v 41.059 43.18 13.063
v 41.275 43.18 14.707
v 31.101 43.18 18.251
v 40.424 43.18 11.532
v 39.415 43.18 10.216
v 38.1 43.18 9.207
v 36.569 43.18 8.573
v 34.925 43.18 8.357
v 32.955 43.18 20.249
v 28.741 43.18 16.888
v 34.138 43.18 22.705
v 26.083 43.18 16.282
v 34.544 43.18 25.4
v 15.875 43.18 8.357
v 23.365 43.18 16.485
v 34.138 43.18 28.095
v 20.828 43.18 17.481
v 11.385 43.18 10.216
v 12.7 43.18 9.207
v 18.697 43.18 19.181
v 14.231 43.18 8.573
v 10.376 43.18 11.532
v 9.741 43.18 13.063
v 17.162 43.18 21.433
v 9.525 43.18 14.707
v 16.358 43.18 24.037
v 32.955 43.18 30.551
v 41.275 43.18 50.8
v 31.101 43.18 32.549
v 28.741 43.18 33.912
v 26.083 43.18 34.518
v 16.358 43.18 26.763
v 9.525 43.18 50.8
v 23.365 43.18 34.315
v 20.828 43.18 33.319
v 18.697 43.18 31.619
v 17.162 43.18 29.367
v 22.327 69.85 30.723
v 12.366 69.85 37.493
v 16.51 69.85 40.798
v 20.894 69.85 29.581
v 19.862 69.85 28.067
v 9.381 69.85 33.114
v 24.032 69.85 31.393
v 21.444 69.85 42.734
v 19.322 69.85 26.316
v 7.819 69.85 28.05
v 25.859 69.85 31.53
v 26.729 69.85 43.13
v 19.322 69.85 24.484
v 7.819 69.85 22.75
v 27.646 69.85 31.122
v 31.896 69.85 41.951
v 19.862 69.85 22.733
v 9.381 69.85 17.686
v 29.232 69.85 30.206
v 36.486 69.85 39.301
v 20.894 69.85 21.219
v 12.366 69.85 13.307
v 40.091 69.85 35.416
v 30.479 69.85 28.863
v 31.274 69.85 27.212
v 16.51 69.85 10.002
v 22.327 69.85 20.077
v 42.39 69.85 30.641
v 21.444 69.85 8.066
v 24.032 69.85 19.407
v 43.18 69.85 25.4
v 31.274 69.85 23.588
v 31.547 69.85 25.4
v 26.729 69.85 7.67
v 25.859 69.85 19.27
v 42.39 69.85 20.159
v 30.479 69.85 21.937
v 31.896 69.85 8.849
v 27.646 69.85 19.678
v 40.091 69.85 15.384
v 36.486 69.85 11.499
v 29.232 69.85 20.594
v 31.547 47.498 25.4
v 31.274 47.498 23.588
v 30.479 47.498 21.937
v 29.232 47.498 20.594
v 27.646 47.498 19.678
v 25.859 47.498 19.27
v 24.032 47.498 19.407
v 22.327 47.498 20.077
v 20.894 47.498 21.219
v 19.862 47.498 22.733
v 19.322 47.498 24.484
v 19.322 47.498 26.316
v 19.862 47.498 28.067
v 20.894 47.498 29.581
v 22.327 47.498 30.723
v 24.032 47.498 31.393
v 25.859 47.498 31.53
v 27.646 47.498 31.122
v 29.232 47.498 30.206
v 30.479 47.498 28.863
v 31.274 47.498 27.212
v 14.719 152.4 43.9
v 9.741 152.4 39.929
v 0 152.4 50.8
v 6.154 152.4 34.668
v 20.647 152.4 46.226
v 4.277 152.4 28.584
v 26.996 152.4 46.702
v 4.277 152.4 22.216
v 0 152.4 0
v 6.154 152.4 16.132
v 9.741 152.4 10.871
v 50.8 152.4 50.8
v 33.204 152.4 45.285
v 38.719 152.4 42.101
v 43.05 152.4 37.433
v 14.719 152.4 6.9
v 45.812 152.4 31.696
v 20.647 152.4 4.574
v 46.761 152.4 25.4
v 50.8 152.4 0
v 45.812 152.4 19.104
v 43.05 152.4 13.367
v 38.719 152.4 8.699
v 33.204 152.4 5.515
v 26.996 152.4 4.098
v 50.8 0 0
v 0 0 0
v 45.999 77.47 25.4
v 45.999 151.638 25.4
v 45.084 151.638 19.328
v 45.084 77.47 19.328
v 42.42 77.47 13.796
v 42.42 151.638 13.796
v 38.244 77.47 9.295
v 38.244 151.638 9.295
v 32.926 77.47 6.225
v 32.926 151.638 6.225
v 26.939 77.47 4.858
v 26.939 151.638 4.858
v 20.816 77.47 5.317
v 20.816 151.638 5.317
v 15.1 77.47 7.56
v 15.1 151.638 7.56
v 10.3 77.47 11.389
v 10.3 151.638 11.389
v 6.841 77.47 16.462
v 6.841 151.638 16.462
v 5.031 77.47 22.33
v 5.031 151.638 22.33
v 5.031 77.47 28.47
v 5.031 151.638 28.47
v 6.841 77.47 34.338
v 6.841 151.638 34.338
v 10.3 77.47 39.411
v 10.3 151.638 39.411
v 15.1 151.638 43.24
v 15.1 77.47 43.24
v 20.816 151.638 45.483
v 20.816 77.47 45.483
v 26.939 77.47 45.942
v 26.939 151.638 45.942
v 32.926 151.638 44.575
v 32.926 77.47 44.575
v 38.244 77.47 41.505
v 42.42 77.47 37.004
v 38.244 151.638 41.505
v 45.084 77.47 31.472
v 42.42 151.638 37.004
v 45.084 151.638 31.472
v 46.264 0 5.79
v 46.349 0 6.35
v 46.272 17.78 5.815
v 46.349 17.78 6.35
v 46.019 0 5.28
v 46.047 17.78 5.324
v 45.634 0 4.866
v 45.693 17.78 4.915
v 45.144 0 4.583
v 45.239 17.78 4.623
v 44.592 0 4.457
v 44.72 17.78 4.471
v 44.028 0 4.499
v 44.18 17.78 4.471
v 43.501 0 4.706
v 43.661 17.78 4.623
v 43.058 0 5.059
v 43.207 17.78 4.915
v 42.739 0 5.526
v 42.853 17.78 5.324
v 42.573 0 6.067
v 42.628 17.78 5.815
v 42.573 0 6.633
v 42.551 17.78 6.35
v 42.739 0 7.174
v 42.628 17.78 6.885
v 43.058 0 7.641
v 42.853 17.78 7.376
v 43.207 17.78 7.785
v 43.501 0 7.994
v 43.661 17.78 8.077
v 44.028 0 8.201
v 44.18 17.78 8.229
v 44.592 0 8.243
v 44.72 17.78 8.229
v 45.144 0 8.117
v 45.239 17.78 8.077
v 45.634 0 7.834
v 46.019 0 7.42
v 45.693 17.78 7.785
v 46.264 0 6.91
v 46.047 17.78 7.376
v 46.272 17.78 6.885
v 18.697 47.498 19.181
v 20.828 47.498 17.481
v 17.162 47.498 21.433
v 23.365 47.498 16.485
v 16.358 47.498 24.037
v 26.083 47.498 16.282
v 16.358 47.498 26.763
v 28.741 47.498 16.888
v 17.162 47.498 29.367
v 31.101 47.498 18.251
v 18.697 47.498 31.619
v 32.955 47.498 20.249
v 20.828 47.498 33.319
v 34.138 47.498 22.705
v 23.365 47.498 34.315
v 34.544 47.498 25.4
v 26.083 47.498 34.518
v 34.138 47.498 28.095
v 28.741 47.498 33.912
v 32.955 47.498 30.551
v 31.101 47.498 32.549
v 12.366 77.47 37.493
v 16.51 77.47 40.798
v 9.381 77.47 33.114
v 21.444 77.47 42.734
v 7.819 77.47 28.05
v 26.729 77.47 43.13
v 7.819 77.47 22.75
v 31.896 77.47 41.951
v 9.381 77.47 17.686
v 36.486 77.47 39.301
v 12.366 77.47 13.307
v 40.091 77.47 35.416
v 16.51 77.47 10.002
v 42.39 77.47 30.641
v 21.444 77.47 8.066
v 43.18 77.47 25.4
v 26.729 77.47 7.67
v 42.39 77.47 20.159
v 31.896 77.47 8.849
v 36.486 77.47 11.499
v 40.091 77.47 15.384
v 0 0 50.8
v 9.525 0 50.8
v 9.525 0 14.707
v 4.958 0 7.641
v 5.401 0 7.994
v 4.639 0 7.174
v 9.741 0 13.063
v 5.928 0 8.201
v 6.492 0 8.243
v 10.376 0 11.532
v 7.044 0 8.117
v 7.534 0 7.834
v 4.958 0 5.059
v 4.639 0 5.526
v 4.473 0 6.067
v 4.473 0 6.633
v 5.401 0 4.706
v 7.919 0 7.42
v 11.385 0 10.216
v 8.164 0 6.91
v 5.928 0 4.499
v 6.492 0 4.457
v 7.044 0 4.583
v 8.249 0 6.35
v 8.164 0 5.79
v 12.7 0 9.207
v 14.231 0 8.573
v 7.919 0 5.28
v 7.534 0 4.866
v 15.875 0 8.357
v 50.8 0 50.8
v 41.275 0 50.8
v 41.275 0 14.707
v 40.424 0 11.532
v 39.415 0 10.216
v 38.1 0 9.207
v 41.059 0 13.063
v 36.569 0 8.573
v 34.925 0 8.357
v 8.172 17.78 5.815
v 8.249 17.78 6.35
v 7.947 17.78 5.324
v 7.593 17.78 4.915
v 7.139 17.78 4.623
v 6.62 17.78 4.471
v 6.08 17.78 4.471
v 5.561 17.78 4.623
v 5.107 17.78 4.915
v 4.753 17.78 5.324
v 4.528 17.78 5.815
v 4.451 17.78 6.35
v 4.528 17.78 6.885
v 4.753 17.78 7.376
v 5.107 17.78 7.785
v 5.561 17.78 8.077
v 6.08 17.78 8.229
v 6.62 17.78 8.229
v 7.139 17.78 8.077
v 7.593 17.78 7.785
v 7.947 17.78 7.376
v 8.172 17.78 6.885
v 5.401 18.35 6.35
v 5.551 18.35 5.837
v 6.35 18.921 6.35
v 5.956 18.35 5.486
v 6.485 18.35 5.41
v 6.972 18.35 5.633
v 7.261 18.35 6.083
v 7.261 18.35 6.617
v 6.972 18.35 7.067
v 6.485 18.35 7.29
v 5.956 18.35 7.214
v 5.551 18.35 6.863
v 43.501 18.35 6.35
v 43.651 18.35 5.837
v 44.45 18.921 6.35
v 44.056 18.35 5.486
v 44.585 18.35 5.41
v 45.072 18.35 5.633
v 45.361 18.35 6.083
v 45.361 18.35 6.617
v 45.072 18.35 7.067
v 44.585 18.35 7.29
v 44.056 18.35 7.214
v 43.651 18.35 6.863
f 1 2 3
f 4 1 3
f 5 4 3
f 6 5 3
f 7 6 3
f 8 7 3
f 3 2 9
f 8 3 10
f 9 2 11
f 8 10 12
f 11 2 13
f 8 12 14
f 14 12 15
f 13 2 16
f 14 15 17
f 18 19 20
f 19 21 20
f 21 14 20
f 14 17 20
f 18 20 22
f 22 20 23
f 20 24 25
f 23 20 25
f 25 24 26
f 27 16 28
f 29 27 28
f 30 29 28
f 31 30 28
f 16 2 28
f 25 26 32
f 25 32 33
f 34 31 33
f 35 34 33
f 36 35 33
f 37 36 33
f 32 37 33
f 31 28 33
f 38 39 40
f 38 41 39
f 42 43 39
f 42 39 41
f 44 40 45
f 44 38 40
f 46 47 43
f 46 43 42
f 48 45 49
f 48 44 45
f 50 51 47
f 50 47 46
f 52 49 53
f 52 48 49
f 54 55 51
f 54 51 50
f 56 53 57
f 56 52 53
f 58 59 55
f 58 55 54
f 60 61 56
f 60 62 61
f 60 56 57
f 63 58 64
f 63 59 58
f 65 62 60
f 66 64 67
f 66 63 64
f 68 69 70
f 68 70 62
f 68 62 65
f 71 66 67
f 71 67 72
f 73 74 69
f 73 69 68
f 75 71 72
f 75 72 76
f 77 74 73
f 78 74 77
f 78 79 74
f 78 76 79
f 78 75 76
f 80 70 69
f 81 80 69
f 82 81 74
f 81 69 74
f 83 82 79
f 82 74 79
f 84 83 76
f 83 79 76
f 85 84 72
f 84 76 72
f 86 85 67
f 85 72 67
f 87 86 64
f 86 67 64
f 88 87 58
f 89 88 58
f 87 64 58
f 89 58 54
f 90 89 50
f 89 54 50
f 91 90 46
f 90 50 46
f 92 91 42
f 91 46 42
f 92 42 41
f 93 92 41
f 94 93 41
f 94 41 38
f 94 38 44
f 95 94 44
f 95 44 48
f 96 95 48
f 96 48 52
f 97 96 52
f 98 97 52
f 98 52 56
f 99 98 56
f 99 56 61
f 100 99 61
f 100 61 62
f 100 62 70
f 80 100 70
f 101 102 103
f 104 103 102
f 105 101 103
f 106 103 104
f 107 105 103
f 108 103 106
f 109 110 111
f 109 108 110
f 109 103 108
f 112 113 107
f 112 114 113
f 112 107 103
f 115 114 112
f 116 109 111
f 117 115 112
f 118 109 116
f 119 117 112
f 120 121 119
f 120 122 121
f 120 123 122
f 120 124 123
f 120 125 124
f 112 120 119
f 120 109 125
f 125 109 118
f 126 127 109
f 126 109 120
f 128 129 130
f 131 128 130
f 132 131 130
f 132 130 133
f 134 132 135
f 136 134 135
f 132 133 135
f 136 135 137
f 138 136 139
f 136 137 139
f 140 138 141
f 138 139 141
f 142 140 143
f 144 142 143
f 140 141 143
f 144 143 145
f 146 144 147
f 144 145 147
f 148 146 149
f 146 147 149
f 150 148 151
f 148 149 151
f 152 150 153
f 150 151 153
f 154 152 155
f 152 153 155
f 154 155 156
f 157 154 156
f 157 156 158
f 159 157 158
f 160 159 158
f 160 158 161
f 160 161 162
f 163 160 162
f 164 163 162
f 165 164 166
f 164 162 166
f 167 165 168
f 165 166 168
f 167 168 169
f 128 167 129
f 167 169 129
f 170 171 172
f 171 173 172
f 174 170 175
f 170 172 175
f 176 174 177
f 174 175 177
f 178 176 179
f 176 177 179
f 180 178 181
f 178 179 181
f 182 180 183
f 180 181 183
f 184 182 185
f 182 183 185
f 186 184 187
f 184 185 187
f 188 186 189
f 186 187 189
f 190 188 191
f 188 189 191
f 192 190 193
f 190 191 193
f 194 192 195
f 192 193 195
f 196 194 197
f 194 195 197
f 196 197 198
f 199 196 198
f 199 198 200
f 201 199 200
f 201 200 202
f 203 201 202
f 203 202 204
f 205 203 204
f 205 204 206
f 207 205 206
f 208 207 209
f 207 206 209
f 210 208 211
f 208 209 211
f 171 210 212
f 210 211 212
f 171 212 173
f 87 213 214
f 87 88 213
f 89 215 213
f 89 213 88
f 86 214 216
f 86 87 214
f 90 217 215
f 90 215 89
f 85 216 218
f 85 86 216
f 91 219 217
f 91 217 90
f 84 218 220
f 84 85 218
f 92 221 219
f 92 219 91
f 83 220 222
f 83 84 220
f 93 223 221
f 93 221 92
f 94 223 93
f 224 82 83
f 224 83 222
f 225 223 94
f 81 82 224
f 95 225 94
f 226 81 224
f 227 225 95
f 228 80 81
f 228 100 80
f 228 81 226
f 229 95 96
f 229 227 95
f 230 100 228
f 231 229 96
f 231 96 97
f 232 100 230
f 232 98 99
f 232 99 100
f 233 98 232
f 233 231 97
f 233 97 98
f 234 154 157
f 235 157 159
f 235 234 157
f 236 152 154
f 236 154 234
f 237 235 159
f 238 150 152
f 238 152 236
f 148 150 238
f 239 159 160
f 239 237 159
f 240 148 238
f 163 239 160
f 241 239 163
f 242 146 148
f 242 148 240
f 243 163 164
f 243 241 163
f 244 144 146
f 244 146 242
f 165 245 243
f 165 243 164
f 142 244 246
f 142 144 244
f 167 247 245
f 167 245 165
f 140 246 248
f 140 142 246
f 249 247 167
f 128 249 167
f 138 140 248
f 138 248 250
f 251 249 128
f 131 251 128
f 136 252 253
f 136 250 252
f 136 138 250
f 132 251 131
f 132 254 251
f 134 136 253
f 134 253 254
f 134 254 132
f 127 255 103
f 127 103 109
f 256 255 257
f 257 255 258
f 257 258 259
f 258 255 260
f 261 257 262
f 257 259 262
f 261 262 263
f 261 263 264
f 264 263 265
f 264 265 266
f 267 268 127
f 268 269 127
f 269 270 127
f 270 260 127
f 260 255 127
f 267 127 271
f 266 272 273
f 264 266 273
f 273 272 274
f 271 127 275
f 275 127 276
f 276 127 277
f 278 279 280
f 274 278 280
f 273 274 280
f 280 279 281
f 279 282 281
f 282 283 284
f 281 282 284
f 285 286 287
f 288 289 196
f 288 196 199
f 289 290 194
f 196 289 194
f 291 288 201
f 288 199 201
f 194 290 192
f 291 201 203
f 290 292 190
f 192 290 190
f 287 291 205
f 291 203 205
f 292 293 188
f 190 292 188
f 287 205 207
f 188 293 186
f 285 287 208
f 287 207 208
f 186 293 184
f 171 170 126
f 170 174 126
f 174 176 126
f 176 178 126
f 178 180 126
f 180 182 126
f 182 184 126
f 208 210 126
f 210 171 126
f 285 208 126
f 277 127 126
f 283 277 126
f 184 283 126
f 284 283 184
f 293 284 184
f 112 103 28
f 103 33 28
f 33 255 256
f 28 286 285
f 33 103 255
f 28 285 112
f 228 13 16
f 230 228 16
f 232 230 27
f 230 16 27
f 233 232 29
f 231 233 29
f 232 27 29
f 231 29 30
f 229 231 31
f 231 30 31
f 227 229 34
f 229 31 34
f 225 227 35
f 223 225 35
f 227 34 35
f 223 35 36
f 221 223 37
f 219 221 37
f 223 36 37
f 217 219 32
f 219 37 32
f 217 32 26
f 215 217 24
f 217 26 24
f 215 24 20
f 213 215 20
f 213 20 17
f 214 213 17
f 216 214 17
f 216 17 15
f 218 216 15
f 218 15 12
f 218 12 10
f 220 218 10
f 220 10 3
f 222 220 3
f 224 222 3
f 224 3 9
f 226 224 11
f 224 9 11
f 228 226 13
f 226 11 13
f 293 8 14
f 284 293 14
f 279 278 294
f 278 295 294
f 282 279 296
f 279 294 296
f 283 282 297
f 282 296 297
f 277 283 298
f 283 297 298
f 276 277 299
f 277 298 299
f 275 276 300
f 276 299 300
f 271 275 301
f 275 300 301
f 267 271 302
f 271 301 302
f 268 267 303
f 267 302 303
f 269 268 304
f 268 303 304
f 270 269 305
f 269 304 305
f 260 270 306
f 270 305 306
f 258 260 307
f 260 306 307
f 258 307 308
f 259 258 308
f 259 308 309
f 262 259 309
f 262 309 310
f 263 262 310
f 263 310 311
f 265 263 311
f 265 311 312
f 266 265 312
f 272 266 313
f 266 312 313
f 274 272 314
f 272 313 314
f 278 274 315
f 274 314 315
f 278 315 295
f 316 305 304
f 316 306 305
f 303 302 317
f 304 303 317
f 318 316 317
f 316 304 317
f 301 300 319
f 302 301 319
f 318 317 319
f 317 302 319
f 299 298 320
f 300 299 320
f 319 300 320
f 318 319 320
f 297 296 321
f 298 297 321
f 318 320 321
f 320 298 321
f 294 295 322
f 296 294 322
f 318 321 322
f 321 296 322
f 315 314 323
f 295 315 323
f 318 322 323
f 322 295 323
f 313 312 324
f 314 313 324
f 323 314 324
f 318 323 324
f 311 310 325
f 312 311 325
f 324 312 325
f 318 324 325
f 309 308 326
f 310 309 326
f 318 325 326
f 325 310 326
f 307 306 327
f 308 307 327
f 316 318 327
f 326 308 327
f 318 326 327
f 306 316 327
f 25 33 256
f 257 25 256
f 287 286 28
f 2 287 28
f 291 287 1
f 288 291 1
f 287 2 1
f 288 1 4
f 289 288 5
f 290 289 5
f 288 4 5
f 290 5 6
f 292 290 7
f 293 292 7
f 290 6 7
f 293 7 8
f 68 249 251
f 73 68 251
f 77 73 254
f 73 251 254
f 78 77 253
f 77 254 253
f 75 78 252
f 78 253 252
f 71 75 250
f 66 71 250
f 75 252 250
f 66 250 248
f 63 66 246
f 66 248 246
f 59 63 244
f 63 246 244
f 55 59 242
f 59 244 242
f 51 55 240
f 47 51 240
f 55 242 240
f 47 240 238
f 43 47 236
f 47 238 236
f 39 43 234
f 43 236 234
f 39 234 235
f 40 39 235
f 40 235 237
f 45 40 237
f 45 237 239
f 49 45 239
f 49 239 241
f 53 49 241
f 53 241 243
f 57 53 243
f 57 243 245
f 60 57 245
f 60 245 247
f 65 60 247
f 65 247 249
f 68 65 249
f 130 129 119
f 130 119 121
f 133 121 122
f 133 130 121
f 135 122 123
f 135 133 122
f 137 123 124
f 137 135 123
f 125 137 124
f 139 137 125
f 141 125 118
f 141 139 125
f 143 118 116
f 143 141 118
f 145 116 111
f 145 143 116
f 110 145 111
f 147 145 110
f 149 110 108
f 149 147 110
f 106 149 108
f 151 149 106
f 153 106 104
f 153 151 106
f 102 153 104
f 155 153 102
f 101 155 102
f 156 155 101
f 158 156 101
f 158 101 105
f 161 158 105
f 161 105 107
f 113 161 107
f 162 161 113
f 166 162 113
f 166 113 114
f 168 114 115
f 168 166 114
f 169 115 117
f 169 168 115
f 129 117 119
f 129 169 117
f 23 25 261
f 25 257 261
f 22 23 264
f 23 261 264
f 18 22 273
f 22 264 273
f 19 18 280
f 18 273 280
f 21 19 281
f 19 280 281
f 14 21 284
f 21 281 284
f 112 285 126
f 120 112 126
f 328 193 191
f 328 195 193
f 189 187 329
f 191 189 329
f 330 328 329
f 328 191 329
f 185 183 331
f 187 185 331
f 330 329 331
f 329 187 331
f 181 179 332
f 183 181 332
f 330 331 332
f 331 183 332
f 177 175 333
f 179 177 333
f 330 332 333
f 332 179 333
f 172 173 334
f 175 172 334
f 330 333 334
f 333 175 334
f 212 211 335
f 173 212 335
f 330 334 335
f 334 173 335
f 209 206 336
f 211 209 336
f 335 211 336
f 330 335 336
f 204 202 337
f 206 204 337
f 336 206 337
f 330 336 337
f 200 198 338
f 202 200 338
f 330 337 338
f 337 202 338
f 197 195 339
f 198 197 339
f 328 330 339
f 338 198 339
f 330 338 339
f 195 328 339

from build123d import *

# Parameters (mm, degrees)
SKETCH1_W                  = 50.8
SKETCH1_H                  = 50.8
BOSS_EXTRUDE1_DEPTH        = 152.4
SKETCH2_R                  = 6.1468
CUT_EXTRUDE1_DEPTH         = 153.4
SKETCH3_R                  = 20.5994
CUT_EXTRUDE2_DEPTH         = 74.93
SKETCH4_R                  = 17.78
CUT_EXTRUDE3_DEPTH         = 82.55
CUT_EXTRUDE4_DEPTH         = 42.4434
SKETCH6_R                  = 9.144
CUT_EXTRUDE5_DEPTH         = 4.318
FILLET1_R                  = 6.35
F_10_24_TAPPED_HOLE1_D     = 3.7973
F_10_24_TAPPED_HOLE1_DEPTH = 17.78
F_10_24_TAPPED_HOLE1_TIP   = 1.140824014
CHAMFER1_SIZE              = 0.762


with BuildPart() as part:
    # Sketch1 → Boss-Extrude1 (new body)
    with BuildSketch(Plane(origin=(0, 0, 0), x_dir=(1, 0, 0), z_dir=(0, 1, 0))):
        with Locations((25.4, -25.4)):
            Rectangle(SKETCH1_W, SKETCH1_H)
    extrude(amount=BOSS_EXTRUDE1_DEPTH)

    # Sketch2 → Cut-Extrude1 (cut, through all)
    with BuildSketch(Plane(origin=(0, 152.4, 0), x_dir=(1, 0, 0), z_dir=(0, 1, 0))):
        with Locations((25.4, -25.4)):
            Circle(SKETCH2_R)
    extrude(amount=-CUT_EXTRUDE1_DEPTH, mode=Mode.SUBTRACT)

    # Sketch3 → Cut-Extrude2 (cut)
    with BuildSketch(Plane(origin=(0, 152.4, 0), x_dir=(1, 0, 0), z_dir=(0, 1, 0))):
        with Locations((25.4, -25.4)):
            Circle(SKETCH3_R)
    extrude(amount=-CUT_EXTRUDE2_DEPTH, mode=Mode.SUBTRACT)

    # Sketch4 → Cut-Extrude3 (cut)
    with BuildSketch(Plane(origin=(0, 152.4, 0), x_dir=(1, 0, 0), z_dir=(0, 1, 0))):
        with Locations((25.4, -25.4)):
            Circle(SKETCH4_R)
    extrude(amount=-CUT_EXTRUDE3_DEPTH, mode=Mode.SUBTRACT)

    # Sketch5 → Cut-Extrude4 (cut)
    with BuildSketch(Plane.XY.offset(50.8)):
        Polygon((9.525, 0), (9.525, 36.83), (9.525, 43.18), (15.875, 43.18), (34.925, 43.18), (41.275, 43.18), (41.275, 36.83), (41.275, 0), align=None)
    extrude(amount=-CUT_EXTRUDE4_DEPTH, mode=Mode.SUBTRACT)

    # Sketch6 → Cut-Extrude5 (cut)
    with BuildSketch(Plane.XZ.offset(-43.18)):
        with Locations((25.4, 25.4)):
            Circle(SKETCH6_R)
    extrude(amount=-CUT_EXTRUDE5_DEPTH, mode=Mode.SUBTRACT)

    # Fillet1
    fillet1_edges = [part.edges().sort_by_distance(p)[0] for p in [
        (9.525, 21.59, 8.3566),
        (41.275, 21.59, 8.3566),
    ]]
    fillet(fillet1_edges, radius=FILLET1_R)

    # #10-24 Tapped Hole1
    with Locations(Plane(origin=(0, 0, 0), x_dir=(-1, 0, 0), z_dir=(0, -1, 0))):
        with Locations((-6.35, -6.35), (-44.45, -6.35)):
            Hole(F_10_24_TAPPED_HOLE1_D / 2, depth=F_10_24_TAPPED_HOLE1_DEPTH)
            with Locations((0, 0, -(F_10_24_TAPPED_HOLE1_DEPTH + F_10_24_TAPPED_HOLE1_TIP / 2))):  # 118° drill point
                Cone(0, F_10_24_TAPPED_HOLE1_D / 2, F_10_24_TAPPED_HOLE1_TIP, mode=Mode.SUBTRACT)

    # Chamfer1
    chamfer1_edges = [part.edges().sort_by_distance(p)[0] for p in [
        (4.8006, 152.4, 25.4),
    ]]
    chamfer(chamfer1_edges, length=CHAMFER1_SIZE)


solid = part.part
